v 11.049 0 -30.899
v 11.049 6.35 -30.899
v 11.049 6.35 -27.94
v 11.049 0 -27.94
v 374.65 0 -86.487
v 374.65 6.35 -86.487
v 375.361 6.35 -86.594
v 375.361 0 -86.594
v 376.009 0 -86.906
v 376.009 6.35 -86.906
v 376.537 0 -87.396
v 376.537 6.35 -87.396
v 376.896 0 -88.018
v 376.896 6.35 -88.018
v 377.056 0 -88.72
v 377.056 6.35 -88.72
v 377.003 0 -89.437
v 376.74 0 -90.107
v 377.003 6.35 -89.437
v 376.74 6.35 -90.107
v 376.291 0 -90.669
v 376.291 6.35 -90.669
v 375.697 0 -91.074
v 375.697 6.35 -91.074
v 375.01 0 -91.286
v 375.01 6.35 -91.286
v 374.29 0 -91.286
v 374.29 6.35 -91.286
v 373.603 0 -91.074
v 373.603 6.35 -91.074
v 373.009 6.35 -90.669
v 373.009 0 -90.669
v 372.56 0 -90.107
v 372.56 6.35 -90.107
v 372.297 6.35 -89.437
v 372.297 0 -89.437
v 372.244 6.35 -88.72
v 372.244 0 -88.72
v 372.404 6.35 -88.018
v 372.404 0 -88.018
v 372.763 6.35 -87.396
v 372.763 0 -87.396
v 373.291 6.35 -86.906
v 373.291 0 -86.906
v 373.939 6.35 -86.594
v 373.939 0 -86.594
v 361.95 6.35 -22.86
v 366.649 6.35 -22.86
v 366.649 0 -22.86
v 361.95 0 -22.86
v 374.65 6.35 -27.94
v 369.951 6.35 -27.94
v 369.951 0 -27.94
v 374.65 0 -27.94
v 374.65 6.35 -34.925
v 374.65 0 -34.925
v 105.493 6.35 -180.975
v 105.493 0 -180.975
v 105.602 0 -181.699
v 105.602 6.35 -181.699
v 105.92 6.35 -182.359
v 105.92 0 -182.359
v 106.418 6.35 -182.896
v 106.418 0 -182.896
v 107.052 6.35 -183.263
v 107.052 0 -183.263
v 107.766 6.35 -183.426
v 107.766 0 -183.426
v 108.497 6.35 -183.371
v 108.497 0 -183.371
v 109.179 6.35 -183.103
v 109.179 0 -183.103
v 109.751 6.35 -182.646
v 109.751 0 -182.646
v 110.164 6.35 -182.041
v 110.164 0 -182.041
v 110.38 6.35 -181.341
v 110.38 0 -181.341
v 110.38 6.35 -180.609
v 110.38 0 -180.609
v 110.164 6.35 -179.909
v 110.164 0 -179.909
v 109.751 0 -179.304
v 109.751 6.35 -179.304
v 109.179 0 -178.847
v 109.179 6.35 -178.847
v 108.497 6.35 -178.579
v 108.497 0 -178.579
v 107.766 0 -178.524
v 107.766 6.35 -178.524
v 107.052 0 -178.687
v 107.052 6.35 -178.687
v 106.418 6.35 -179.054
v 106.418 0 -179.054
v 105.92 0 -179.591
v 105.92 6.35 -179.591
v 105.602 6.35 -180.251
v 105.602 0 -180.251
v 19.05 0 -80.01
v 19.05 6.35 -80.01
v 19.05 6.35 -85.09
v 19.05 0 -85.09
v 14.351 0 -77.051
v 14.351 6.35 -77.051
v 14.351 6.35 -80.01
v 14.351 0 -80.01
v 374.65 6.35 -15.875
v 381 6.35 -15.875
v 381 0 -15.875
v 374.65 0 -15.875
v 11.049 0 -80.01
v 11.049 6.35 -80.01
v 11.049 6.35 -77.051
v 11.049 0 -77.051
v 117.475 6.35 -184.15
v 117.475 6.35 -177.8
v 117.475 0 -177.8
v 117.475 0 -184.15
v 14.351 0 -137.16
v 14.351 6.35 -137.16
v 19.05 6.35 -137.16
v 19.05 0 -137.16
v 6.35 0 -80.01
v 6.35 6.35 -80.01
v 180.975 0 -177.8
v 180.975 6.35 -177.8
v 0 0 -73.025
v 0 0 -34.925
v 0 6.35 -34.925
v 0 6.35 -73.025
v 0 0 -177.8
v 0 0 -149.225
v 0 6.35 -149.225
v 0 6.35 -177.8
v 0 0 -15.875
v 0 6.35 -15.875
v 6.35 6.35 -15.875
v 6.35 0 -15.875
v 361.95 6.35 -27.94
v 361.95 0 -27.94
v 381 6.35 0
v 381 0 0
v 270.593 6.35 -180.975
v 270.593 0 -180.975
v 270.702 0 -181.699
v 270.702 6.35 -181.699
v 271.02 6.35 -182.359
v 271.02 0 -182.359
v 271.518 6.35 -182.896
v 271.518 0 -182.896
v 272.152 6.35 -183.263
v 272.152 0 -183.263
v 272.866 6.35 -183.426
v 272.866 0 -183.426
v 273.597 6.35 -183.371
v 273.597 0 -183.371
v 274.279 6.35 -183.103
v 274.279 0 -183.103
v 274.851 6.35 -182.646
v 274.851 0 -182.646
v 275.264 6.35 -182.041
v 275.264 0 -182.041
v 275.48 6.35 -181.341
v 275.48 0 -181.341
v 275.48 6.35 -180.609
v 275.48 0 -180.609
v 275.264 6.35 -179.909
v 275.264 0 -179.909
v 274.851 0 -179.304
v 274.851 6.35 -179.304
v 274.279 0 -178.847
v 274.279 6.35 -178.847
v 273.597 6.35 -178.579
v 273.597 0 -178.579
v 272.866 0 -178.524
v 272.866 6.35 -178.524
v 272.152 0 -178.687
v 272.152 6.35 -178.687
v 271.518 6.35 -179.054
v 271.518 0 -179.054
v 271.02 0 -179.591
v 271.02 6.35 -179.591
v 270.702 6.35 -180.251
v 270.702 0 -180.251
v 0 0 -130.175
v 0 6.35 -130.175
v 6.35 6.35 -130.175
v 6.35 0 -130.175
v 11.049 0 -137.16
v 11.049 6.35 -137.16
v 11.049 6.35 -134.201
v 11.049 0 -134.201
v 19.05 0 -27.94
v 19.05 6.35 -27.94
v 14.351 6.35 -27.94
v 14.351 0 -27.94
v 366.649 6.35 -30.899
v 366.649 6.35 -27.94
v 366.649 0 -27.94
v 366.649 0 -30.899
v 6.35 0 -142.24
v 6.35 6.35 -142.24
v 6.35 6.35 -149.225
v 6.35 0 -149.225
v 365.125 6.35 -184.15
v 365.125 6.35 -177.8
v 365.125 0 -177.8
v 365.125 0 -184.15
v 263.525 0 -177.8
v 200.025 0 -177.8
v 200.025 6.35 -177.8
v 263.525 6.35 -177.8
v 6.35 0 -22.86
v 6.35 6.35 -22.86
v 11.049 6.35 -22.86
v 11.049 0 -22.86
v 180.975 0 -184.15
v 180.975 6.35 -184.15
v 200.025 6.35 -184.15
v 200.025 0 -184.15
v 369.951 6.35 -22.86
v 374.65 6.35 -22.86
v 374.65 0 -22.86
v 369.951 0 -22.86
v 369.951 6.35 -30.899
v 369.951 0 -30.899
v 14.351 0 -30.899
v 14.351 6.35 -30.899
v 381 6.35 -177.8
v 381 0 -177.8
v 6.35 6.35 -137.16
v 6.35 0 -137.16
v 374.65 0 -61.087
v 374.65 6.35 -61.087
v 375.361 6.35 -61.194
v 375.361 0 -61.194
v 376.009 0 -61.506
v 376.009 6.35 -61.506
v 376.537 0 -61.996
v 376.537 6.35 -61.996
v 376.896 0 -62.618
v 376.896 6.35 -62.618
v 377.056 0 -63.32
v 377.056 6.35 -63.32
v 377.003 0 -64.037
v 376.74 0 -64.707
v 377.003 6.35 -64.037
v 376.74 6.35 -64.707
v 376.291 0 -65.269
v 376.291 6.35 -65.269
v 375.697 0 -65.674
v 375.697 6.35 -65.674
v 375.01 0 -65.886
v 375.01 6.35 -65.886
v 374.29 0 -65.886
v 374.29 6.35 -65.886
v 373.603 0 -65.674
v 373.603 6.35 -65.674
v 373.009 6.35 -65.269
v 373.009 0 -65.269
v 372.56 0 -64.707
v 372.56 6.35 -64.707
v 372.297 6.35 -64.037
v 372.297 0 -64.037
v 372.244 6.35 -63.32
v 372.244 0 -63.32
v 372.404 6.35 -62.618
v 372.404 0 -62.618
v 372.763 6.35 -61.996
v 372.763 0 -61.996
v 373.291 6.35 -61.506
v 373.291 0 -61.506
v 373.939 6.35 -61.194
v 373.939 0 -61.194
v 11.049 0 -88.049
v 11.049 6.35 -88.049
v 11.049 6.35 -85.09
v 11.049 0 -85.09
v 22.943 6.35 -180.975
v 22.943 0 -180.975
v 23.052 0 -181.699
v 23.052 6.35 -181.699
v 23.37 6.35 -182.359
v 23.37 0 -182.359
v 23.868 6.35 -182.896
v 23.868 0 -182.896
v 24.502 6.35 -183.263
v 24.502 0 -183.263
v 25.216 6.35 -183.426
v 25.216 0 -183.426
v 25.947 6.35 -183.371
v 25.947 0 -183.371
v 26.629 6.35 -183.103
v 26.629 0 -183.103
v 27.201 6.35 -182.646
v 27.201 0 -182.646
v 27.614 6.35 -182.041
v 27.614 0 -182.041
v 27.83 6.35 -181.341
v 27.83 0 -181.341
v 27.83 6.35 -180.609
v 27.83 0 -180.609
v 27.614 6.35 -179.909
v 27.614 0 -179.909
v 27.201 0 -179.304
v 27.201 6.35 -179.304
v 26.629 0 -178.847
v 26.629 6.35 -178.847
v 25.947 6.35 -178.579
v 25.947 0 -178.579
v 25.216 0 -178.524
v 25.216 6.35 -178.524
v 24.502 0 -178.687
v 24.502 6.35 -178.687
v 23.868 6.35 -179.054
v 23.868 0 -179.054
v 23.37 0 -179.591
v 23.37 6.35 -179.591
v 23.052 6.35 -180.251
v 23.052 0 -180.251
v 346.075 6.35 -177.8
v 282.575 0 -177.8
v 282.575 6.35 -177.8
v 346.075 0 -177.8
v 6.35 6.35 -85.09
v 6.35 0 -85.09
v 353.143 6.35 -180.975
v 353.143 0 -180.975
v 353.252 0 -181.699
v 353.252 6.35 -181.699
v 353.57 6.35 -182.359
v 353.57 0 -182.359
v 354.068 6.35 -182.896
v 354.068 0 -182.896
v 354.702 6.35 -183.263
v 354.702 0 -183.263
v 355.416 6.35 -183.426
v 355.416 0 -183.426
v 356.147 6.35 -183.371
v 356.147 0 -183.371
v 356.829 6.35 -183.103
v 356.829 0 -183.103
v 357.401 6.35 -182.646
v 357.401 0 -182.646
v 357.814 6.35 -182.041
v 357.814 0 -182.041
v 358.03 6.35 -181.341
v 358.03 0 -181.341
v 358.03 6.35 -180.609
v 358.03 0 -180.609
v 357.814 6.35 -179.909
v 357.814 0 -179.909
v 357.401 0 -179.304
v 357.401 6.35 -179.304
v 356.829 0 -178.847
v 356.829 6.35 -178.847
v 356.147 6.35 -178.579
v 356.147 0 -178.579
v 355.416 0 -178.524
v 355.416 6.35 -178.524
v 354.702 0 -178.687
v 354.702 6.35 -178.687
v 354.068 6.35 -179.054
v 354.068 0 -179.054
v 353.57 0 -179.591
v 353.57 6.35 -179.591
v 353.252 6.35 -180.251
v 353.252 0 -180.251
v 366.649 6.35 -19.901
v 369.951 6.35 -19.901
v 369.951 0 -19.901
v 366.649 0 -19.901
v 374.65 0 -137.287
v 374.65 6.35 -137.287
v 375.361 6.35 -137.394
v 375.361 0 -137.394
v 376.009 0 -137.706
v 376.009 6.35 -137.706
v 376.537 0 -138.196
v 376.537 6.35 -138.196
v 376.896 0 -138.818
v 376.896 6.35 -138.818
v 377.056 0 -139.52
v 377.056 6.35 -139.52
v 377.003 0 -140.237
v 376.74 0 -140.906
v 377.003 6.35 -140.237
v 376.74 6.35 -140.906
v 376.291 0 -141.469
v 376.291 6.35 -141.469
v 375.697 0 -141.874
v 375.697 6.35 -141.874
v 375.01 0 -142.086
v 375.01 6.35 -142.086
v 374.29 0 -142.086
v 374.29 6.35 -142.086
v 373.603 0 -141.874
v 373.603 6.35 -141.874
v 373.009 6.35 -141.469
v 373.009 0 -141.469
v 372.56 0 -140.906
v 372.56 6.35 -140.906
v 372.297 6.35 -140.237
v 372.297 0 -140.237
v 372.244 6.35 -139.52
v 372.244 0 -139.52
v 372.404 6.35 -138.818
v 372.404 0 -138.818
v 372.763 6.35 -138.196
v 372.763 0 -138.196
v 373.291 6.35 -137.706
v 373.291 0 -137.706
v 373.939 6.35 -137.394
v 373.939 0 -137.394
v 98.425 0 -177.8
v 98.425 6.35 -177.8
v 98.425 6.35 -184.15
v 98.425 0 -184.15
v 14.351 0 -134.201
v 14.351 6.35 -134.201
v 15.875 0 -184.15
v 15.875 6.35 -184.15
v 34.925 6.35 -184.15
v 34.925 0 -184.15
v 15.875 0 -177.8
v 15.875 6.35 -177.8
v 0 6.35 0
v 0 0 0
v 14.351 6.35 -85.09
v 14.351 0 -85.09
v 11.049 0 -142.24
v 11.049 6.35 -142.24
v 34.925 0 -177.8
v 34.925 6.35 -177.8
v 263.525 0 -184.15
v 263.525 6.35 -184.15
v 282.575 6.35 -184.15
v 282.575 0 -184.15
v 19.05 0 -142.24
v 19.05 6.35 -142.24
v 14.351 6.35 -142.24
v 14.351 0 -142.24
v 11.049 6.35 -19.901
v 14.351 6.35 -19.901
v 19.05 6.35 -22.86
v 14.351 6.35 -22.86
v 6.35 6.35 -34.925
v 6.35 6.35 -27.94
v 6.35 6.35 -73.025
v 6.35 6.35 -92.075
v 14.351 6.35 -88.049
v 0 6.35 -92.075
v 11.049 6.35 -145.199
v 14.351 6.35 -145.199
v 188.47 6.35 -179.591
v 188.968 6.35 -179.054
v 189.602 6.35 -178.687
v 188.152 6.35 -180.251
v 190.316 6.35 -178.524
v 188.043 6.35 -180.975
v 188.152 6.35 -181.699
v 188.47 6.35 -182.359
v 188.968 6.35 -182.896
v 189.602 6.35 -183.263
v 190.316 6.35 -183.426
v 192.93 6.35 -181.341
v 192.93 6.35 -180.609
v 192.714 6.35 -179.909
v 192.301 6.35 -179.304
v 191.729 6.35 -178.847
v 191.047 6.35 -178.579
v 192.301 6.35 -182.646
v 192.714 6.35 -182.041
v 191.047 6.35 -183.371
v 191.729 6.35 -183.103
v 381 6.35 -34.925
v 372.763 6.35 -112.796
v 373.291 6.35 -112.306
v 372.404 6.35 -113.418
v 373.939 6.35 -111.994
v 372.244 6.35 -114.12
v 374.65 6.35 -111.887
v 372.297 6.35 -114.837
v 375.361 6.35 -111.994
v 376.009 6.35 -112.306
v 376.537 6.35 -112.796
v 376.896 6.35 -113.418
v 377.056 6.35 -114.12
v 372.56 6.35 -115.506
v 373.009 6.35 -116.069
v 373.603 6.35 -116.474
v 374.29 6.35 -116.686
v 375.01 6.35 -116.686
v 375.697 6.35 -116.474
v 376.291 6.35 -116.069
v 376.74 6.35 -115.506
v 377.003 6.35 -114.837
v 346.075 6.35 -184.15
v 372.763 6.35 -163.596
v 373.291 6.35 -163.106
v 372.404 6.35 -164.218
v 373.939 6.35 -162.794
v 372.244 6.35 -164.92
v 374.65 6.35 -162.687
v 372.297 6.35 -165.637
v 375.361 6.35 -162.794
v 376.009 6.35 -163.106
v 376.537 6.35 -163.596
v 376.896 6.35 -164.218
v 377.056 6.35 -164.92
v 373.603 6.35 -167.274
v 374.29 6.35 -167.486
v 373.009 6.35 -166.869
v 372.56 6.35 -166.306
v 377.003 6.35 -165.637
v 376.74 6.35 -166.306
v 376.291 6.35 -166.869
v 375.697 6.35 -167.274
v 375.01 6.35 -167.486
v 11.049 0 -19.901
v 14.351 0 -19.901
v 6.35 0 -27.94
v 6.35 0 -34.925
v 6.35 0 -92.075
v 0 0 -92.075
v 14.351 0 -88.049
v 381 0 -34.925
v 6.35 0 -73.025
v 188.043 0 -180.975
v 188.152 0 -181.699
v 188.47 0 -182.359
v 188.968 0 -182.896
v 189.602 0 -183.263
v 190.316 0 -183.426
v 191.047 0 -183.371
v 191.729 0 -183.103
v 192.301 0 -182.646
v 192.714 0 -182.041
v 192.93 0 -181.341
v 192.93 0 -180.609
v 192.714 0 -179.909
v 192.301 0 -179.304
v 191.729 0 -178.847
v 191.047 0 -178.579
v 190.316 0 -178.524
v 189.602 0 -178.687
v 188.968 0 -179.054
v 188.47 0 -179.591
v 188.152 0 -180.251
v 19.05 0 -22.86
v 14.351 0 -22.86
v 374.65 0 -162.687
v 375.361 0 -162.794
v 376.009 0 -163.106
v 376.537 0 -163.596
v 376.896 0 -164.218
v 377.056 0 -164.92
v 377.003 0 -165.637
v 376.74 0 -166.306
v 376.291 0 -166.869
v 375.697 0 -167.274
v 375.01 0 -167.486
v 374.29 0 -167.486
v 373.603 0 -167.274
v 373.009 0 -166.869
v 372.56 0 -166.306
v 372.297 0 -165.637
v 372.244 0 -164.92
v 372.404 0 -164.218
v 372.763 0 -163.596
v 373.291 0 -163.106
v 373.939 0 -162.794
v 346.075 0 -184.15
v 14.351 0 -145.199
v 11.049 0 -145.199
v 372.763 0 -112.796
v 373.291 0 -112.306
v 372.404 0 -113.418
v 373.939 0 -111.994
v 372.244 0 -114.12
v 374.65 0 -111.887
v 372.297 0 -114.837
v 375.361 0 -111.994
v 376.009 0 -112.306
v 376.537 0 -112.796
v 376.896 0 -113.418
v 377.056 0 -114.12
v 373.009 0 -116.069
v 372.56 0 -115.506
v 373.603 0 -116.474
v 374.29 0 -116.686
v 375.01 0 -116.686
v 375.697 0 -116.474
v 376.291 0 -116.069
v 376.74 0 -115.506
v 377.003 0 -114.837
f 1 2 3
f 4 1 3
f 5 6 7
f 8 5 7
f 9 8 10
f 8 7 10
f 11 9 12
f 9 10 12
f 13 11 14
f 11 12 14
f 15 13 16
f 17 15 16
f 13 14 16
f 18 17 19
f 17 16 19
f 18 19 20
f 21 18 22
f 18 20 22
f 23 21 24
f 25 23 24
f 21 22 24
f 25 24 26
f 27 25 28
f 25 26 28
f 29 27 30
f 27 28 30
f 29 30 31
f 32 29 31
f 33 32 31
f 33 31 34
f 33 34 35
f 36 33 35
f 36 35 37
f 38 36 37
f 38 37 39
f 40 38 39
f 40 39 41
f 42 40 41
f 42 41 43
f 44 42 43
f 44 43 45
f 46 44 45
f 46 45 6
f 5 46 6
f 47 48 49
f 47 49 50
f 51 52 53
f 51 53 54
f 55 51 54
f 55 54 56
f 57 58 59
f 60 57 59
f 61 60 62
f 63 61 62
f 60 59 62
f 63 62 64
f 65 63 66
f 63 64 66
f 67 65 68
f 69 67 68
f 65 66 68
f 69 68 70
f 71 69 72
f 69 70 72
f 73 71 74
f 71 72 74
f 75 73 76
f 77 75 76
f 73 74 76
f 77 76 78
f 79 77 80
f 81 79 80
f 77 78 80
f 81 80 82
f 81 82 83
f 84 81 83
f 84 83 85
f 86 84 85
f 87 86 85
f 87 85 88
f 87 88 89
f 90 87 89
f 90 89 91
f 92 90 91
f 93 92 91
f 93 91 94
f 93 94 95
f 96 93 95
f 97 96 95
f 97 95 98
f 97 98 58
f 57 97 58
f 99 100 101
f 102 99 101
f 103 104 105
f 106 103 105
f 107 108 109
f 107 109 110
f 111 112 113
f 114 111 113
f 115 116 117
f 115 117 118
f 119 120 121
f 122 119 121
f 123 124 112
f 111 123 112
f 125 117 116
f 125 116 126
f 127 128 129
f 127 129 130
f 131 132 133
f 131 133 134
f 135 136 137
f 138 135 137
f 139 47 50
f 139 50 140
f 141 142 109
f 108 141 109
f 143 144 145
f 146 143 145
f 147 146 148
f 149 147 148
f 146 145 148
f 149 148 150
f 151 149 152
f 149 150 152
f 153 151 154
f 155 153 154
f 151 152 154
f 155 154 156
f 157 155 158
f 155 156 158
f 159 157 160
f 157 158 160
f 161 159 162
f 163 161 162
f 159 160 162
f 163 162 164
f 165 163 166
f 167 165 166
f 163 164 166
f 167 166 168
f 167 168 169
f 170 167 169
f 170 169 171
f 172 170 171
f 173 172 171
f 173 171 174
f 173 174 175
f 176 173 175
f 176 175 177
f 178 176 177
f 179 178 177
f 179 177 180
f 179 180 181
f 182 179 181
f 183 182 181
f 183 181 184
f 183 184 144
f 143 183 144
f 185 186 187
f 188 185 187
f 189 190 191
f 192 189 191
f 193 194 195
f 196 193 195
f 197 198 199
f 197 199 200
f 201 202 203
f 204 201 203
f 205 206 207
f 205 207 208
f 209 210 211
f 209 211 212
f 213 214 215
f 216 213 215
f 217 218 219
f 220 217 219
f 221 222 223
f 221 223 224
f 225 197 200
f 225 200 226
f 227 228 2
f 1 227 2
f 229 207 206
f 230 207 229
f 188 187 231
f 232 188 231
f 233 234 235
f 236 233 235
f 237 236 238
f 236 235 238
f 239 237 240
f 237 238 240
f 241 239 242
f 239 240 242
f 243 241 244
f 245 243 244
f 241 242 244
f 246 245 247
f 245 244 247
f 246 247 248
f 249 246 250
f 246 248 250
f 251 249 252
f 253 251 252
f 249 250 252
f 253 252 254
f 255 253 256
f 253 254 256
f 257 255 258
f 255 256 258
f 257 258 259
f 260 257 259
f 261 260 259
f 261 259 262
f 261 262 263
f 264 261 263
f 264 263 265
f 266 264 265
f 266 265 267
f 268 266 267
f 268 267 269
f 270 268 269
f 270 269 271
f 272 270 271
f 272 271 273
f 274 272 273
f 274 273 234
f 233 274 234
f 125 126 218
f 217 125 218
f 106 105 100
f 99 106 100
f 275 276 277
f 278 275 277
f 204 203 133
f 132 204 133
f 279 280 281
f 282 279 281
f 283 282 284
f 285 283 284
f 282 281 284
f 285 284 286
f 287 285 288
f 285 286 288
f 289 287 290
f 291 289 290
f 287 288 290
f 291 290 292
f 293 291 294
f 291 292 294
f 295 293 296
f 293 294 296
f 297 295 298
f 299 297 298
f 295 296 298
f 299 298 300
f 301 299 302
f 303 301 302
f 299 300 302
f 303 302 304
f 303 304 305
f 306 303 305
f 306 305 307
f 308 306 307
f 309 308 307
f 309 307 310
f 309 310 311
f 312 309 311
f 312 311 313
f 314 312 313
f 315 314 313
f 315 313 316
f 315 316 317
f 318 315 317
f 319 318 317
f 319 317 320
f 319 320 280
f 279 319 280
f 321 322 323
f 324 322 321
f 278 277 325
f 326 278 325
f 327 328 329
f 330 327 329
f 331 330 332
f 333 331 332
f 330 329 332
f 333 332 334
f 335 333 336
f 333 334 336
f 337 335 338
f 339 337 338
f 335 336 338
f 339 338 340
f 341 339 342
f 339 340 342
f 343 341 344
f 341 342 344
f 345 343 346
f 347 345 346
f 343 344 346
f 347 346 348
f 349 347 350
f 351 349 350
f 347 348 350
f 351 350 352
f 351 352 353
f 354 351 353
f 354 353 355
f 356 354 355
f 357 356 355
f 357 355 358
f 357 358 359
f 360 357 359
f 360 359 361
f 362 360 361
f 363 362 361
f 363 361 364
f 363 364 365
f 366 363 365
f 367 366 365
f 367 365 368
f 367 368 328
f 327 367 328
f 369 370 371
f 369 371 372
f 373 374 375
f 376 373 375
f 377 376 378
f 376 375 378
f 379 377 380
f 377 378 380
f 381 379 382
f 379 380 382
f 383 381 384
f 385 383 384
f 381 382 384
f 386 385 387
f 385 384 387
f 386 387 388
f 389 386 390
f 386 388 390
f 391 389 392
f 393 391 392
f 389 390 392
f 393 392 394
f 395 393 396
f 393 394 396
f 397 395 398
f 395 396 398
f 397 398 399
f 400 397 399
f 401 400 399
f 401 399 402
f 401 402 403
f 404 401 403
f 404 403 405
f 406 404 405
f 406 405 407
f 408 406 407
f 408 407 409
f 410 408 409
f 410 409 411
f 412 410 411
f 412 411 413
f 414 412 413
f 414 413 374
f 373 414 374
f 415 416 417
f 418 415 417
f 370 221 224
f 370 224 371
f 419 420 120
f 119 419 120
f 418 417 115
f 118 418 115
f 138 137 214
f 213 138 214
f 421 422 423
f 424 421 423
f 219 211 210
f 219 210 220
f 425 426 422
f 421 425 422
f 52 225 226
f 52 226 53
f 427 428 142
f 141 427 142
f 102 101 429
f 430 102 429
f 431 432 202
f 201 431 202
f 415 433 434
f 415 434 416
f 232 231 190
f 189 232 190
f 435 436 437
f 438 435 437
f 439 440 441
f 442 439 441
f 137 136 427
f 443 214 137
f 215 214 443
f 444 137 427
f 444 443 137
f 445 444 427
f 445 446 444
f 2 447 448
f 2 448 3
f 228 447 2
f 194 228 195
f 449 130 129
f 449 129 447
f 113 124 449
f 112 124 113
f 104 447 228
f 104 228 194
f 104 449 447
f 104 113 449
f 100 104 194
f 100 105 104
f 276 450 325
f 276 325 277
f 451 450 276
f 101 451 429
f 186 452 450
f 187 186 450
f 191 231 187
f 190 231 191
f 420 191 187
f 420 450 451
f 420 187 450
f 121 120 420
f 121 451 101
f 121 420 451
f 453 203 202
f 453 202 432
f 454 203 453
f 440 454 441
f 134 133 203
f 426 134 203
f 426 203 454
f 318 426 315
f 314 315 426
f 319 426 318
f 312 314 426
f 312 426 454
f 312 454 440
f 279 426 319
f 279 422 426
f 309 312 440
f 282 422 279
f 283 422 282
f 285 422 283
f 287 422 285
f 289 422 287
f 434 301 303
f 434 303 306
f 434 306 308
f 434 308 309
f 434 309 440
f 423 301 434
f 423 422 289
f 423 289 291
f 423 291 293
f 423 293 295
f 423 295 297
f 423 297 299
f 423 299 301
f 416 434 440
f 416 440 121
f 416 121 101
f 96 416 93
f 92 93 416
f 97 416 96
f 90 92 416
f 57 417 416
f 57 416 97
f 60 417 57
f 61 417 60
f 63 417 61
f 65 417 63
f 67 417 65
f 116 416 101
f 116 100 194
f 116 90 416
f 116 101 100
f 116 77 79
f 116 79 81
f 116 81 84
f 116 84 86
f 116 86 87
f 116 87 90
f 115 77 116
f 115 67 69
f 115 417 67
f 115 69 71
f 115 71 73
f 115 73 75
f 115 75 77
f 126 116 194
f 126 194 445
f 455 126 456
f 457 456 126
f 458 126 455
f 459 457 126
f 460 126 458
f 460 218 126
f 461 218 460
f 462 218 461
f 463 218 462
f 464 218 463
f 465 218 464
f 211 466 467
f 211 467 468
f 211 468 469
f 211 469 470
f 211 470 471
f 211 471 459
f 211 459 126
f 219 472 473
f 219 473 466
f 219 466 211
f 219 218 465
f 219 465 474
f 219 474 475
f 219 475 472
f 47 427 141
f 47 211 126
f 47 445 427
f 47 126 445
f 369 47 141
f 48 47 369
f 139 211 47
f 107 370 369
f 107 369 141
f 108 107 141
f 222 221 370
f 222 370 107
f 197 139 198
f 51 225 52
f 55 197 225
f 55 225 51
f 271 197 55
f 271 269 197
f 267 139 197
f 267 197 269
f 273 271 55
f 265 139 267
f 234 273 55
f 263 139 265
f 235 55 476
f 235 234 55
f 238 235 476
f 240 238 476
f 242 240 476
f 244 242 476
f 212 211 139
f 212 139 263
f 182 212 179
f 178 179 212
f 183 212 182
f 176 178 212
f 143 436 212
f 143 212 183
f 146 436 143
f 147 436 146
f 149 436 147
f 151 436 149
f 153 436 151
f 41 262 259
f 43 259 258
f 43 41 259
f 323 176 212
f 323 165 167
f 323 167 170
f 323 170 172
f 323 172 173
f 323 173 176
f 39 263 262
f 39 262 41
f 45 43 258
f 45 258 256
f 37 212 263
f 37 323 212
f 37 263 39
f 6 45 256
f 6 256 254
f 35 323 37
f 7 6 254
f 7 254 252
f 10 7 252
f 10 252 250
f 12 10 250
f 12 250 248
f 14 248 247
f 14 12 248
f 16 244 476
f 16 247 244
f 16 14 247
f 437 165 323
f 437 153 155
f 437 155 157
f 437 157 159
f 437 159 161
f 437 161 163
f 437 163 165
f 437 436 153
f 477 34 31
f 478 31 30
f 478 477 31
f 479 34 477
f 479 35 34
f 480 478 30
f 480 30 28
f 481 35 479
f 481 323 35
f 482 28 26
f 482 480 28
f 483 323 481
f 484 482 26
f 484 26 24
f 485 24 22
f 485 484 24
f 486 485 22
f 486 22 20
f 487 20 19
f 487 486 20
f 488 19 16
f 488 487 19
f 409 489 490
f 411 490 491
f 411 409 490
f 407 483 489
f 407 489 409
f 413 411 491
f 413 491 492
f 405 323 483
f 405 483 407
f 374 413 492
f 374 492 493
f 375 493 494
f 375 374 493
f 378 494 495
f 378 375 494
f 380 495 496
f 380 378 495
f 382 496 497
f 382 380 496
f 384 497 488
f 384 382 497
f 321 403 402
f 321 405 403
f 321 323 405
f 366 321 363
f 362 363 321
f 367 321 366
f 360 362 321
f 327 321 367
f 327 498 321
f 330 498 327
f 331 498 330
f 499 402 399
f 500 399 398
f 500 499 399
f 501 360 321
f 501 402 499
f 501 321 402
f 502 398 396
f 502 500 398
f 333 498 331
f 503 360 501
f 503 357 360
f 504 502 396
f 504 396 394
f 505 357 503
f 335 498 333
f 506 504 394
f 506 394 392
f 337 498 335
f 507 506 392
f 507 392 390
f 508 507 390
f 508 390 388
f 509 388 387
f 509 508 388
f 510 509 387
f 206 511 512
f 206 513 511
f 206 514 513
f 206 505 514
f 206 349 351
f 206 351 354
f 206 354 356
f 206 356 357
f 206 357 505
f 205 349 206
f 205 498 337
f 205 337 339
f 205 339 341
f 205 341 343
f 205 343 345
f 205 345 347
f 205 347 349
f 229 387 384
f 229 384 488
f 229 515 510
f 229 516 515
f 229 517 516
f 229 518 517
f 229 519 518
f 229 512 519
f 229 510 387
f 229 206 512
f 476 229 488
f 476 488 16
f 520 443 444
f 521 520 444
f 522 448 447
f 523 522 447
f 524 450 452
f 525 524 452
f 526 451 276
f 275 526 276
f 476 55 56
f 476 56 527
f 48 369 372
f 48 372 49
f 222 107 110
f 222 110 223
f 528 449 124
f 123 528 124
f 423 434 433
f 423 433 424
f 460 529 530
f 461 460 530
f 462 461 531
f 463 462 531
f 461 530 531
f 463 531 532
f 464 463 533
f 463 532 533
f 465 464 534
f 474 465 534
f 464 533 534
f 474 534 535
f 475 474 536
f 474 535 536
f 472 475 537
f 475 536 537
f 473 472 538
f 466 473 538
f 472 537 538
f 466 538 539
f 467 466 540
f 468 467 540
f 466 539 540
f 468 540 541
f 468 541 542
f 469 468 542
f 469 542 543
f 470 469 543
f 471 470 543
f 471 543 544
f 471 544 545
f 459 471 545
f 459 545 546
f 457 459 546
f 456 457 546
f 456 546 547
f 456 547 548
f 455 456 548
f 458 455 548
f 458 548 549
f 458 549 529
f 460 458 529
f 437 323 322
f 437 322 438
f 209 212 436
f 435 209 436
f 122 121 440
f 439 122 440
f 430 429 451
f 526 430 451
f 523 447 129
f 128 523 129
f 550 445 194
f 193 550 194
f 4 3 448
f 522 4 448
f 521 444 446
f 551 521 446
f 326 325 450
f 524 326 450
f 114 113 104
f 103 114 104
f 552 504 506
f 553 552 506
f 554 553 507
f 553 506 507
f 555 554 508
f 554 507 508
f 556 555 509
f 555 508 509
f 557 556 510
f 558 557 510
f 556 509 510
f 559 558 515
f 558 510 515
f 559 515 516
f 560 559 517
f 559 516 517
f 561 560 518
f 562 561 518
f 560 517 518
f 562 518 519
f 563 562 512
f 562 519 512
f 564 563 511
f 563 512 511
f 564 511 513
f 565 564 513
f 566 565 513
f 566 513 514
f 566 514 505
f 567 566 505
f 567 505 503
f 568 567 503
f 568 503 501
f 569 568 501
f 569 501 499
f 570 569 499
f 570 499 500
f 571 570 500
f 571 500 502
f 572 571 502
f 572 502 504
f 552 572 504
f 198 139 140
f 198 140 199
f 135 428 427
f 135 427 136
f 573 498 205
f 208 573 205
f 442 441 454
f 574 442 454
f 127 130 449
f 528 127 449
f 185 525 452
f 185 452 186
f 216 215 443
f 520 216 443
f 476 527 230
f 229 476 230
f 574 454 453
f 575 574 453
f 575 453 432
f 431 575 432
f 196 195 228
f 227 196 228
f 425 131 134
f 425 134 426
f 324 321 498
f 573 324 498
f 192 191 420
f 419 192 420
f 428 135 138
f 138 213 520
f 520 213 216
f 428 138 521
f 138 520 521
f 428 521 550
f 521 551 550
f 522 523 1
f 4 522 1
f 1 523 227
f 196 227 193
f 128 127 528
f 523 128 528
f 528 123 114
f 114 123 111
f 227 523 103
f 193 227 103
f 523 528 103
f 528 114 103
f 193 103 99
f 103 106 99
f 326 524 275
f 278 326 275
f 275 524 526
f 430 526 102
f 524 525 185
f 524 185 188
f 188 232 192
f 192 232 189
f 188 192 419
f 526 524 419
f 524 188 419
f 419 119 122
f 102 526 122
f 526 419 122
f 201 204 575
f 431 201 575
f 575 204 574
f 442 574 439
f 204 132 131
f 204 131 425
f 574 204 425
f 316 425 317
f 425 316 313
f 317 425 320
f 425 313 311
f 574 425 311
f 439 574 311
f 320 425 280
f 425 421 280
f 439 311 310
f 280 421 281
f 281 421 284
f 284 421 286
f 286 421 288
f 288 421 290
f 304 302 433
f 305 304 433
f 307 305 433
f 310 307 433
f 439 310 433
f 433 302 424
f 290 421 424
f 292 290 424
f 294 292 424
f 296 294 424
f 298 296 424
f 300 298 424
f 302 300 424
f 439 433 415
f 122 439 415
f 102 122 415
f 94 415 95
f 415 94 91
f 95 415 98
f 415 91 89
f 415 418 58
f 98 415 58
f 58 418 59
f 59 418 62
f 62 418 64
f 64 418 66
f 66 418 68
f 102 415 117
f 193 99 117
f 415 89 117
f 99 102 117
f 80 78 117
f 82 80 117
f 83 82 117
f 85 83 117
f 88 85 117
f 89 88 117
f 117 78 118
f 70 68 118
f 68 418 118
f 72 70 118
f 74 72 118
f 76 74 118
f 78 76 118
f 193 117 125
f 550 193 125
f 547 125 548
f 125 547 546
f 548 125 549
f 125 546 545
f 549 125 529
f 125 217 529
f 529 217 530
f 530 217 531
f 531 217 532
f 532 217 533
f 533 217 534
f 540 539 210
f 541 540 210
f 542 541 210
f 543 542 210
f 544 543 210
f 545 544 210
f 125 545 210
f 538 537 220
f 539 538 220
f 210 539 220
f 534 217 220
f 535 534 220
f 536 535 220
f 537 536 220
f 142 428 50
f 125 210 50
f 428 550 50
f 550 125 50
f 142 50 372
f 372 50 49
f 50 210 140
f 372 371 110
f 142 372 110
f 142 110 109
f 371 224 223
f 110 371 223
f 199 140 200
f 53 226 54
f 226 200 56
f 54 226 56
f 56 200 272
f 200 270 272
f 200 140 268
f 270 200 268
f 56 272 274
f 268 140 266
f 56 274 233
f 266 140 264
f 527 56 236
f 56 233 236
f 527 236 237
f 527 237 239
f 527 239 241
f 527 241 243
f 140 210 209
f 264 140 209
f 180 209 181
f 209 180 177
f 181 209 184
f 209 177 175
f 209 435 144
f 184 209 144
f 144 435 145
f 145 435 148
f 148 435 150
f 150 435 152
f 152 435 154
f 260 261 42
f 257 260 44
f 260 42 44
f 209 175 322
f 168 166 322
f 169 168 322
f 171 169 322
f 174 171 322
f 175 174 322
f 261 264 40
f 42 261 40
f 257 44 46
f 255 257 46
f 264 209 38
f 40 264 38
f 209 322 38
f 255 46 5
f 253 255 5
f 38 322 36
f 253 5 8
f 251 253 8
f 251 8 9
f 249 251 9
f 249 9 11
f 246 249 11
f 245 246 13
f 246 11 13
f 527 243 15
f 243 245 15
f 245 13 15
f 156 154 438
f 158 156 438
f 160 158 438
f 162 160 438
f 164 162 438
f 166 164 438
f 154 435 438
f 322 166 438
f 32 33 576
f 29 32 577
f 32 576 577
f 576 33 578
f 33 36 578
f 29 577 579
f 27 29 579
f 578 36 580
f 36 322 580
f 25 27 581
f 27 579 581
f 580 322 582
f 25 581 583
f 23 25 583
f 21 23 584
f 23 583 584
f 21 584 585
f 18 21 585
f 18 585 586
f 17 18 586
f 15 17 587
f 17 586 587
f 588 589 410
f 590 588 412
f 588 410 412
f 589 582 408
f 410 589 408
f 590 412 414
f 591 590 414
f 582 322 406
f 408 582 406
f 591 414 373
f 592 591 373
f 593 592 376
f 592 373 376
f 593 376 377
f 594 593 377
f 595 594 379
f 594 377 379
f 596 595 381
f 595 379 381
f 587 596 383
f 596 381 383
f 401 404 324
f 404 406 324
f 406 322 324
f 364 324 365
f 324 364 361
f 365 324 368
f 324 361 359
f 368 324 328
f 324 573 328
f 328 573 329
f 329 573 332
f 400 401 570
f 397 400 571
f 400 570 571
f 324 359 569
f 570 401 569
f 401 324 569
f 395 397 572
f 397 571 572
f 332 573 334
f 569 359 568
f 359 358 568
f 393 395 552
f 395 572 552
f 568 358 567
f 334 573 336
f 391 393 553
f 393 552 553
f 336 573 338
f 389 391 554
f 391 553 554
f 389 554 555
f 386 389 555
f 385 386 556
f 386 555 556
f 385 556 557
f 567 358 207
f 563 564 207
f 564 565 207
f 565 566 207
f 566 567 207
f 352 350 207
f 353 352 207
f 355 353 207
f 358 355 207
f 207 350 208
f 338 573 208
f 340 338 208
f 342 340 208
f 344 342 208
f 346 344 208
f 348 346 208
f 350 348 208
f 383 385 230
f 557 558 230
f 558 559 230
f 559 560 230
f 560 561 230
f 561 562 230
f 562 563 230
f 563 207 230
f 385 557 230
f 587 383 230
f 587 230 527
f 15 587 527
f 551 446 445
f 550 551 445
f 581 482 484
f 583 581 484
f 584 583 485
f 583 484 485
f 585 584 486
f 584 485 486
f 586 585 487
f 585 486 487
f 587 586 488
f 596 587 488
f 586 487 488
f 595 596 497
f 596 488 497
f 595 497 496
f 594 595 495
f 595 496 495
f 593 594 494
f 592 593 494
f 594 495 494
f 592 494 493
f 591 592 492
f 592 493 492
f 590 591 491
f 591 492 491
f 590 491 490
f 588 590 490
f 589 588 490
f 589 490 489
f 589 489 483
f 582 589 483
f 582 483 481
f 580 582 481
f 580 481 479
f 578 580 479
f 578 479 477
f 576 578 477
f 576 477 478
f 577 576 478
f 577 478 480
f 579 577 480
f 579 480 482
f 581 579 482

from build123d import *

# Parameters (mm, degrees)
SKETCH1_W                    = 381
SKETCH1_H                    = 177.8
BOSS_EXTRUDE1_DEPTH          = 6.35
SKETCH2_W                    = 19.05
SKETCH2_H                    = 6.35
BOSS_EXTRUDE2_DEPTH          = 6.35
F_10_0_1935_DIAMETER_HOLE1_D = 4.9149
LPATTERN1_COUNT              = 5
LPATTERN1_PITCH              = 82.55
CUT_EXTRUDE2_DEPTH           = 424.216900655
LPATTERN4_COUNT              = 3
LPATTERN4_PITCH              = 57.15
SKETCH8_R                    = 2.413
CUT_EXTRUDE3_DEPTH           = 424.216900655


with BuildPart() as part:
    # Sketch1 → Boss-Extrude1 (new body)
    with BuildSketch(Plane(origin=(0, 0, 0), x_dir=(1, 0, 0), z_dir=(0, 1, 0))):
        with Locations((190.5, 88.9)):
            Rectangle(SKETCH1_W, SKETCH1_H)
    extrude(amount=BOSS_EXTRUDE1_DEPTH)

    # Sketch2 → Boss-Extrude2 (add)
    with BuildSketch(Plane(origin=(0, 6.35, 0), x_dir=(1, 0, 0), z_dir=(0, 1, 0))):
        with Locations((25.4, 180.975)):
            Rectangle(SKETCH2_W, SKETCH2_H)
    boss_extrude2 = extrude(amount=-BOSS_EXTRUDE2_DEPTH)

    # #10 (0.1935) Diameter Hole1 (through all)
    with Locations(Plane(origin=(0, 6.35, 0), x_dir=(1, 0, 0), z_dir=(0, 1, 0))):
        with Locations((25.4, 180.975)):
            f_10_0_1935_diameter_hole1 = Hole(F_10_0_1935_DIAMETER_HOLE1_D / 2)

    # LPattern1: Boss-Extrude2, #10 (0.1935) Diameter Hole1 ×5
    with Locations(*[(i * LPATTERN1_PITCH, 0, 0) for i in range(1, LPATTERN1_COUNT)]):
        add(boss_extrude2)
        add(f_10_0_1935_diameter_hole1, mode=Mode.SUBTRACT)

    # Sketch7 → Cut-Extrude2 (cut, through all)
    with BuildSketch(Plane(origin=(0, 6.35, 0), x_dir=(1, 0, 0), z_dir=(0, 1, 0))):
        Polygon((0, 34.925), (0, 15.875), (6.35, 15.875), (6.35, 22.86), (11.049, 22.86), (11.049, 19.9009), (14.351, 19.9009), (14.351, 22.86), (19.05, 22.86), (19.05, 27.94), (14.351, 27.94), (14.351, 30.8991), (11.049, 30.8991), (11.049, 27.94), (6.35, 27.94), (6.35, 34.925), align=None)
    cut_extrude2 = extrude(amount=-CUT_EXTRUDE2_DEPTH, mode=Mode.SUBTRACT)

    # Mirror2: Cut-Extrude2 across plane
    add(cut_extrude2.mirror(Plane.ZY.offset(-190.5)), mode=Mode.SUBTRACT)

    # LPattern4: Cut-Extrude2 ×3
    with Locations(*[(0, 0, -i * LPATTERN4_PITCH) for i in range(1, LPATTERN4_COUNT)]):
        add(cut_extrude2, mode=Mode.SUBTRACT)

    # Sketch8 → Cut-Extrude3 (cut, through all)
    with BuildSketch(Plane(origin=(0, 6.35, 0), x_dir=(1, 0, 0), z_dir=(0, 1, 0))):
        with Locations(Location((374.65, 165.1, 0), (0, 0, 270))):
            Circle(SKETCH8_R)
        with Locations(Location((374.65, 139.7, 0), (0, 0, 270))):
            Circle(SKETCH8_R)
        with Locations(Location((374.65, 114.3, 0), (0, 0, 270))):
            Circle(SKETCH8_R)
        with Locations(Location((374.65, 88.9, 0), (0, 0, 270))):
            Circle(SKETCH8_R)
        with Locations(Location((374.65, 63.5, 0), (0, 0, 270))):
            Circle(SKETCH8_R)
    extrude(amount=-CUT_EXTRUDE3_DEPTH, mode=Mode.SUBTRACT)


solid = part.part
